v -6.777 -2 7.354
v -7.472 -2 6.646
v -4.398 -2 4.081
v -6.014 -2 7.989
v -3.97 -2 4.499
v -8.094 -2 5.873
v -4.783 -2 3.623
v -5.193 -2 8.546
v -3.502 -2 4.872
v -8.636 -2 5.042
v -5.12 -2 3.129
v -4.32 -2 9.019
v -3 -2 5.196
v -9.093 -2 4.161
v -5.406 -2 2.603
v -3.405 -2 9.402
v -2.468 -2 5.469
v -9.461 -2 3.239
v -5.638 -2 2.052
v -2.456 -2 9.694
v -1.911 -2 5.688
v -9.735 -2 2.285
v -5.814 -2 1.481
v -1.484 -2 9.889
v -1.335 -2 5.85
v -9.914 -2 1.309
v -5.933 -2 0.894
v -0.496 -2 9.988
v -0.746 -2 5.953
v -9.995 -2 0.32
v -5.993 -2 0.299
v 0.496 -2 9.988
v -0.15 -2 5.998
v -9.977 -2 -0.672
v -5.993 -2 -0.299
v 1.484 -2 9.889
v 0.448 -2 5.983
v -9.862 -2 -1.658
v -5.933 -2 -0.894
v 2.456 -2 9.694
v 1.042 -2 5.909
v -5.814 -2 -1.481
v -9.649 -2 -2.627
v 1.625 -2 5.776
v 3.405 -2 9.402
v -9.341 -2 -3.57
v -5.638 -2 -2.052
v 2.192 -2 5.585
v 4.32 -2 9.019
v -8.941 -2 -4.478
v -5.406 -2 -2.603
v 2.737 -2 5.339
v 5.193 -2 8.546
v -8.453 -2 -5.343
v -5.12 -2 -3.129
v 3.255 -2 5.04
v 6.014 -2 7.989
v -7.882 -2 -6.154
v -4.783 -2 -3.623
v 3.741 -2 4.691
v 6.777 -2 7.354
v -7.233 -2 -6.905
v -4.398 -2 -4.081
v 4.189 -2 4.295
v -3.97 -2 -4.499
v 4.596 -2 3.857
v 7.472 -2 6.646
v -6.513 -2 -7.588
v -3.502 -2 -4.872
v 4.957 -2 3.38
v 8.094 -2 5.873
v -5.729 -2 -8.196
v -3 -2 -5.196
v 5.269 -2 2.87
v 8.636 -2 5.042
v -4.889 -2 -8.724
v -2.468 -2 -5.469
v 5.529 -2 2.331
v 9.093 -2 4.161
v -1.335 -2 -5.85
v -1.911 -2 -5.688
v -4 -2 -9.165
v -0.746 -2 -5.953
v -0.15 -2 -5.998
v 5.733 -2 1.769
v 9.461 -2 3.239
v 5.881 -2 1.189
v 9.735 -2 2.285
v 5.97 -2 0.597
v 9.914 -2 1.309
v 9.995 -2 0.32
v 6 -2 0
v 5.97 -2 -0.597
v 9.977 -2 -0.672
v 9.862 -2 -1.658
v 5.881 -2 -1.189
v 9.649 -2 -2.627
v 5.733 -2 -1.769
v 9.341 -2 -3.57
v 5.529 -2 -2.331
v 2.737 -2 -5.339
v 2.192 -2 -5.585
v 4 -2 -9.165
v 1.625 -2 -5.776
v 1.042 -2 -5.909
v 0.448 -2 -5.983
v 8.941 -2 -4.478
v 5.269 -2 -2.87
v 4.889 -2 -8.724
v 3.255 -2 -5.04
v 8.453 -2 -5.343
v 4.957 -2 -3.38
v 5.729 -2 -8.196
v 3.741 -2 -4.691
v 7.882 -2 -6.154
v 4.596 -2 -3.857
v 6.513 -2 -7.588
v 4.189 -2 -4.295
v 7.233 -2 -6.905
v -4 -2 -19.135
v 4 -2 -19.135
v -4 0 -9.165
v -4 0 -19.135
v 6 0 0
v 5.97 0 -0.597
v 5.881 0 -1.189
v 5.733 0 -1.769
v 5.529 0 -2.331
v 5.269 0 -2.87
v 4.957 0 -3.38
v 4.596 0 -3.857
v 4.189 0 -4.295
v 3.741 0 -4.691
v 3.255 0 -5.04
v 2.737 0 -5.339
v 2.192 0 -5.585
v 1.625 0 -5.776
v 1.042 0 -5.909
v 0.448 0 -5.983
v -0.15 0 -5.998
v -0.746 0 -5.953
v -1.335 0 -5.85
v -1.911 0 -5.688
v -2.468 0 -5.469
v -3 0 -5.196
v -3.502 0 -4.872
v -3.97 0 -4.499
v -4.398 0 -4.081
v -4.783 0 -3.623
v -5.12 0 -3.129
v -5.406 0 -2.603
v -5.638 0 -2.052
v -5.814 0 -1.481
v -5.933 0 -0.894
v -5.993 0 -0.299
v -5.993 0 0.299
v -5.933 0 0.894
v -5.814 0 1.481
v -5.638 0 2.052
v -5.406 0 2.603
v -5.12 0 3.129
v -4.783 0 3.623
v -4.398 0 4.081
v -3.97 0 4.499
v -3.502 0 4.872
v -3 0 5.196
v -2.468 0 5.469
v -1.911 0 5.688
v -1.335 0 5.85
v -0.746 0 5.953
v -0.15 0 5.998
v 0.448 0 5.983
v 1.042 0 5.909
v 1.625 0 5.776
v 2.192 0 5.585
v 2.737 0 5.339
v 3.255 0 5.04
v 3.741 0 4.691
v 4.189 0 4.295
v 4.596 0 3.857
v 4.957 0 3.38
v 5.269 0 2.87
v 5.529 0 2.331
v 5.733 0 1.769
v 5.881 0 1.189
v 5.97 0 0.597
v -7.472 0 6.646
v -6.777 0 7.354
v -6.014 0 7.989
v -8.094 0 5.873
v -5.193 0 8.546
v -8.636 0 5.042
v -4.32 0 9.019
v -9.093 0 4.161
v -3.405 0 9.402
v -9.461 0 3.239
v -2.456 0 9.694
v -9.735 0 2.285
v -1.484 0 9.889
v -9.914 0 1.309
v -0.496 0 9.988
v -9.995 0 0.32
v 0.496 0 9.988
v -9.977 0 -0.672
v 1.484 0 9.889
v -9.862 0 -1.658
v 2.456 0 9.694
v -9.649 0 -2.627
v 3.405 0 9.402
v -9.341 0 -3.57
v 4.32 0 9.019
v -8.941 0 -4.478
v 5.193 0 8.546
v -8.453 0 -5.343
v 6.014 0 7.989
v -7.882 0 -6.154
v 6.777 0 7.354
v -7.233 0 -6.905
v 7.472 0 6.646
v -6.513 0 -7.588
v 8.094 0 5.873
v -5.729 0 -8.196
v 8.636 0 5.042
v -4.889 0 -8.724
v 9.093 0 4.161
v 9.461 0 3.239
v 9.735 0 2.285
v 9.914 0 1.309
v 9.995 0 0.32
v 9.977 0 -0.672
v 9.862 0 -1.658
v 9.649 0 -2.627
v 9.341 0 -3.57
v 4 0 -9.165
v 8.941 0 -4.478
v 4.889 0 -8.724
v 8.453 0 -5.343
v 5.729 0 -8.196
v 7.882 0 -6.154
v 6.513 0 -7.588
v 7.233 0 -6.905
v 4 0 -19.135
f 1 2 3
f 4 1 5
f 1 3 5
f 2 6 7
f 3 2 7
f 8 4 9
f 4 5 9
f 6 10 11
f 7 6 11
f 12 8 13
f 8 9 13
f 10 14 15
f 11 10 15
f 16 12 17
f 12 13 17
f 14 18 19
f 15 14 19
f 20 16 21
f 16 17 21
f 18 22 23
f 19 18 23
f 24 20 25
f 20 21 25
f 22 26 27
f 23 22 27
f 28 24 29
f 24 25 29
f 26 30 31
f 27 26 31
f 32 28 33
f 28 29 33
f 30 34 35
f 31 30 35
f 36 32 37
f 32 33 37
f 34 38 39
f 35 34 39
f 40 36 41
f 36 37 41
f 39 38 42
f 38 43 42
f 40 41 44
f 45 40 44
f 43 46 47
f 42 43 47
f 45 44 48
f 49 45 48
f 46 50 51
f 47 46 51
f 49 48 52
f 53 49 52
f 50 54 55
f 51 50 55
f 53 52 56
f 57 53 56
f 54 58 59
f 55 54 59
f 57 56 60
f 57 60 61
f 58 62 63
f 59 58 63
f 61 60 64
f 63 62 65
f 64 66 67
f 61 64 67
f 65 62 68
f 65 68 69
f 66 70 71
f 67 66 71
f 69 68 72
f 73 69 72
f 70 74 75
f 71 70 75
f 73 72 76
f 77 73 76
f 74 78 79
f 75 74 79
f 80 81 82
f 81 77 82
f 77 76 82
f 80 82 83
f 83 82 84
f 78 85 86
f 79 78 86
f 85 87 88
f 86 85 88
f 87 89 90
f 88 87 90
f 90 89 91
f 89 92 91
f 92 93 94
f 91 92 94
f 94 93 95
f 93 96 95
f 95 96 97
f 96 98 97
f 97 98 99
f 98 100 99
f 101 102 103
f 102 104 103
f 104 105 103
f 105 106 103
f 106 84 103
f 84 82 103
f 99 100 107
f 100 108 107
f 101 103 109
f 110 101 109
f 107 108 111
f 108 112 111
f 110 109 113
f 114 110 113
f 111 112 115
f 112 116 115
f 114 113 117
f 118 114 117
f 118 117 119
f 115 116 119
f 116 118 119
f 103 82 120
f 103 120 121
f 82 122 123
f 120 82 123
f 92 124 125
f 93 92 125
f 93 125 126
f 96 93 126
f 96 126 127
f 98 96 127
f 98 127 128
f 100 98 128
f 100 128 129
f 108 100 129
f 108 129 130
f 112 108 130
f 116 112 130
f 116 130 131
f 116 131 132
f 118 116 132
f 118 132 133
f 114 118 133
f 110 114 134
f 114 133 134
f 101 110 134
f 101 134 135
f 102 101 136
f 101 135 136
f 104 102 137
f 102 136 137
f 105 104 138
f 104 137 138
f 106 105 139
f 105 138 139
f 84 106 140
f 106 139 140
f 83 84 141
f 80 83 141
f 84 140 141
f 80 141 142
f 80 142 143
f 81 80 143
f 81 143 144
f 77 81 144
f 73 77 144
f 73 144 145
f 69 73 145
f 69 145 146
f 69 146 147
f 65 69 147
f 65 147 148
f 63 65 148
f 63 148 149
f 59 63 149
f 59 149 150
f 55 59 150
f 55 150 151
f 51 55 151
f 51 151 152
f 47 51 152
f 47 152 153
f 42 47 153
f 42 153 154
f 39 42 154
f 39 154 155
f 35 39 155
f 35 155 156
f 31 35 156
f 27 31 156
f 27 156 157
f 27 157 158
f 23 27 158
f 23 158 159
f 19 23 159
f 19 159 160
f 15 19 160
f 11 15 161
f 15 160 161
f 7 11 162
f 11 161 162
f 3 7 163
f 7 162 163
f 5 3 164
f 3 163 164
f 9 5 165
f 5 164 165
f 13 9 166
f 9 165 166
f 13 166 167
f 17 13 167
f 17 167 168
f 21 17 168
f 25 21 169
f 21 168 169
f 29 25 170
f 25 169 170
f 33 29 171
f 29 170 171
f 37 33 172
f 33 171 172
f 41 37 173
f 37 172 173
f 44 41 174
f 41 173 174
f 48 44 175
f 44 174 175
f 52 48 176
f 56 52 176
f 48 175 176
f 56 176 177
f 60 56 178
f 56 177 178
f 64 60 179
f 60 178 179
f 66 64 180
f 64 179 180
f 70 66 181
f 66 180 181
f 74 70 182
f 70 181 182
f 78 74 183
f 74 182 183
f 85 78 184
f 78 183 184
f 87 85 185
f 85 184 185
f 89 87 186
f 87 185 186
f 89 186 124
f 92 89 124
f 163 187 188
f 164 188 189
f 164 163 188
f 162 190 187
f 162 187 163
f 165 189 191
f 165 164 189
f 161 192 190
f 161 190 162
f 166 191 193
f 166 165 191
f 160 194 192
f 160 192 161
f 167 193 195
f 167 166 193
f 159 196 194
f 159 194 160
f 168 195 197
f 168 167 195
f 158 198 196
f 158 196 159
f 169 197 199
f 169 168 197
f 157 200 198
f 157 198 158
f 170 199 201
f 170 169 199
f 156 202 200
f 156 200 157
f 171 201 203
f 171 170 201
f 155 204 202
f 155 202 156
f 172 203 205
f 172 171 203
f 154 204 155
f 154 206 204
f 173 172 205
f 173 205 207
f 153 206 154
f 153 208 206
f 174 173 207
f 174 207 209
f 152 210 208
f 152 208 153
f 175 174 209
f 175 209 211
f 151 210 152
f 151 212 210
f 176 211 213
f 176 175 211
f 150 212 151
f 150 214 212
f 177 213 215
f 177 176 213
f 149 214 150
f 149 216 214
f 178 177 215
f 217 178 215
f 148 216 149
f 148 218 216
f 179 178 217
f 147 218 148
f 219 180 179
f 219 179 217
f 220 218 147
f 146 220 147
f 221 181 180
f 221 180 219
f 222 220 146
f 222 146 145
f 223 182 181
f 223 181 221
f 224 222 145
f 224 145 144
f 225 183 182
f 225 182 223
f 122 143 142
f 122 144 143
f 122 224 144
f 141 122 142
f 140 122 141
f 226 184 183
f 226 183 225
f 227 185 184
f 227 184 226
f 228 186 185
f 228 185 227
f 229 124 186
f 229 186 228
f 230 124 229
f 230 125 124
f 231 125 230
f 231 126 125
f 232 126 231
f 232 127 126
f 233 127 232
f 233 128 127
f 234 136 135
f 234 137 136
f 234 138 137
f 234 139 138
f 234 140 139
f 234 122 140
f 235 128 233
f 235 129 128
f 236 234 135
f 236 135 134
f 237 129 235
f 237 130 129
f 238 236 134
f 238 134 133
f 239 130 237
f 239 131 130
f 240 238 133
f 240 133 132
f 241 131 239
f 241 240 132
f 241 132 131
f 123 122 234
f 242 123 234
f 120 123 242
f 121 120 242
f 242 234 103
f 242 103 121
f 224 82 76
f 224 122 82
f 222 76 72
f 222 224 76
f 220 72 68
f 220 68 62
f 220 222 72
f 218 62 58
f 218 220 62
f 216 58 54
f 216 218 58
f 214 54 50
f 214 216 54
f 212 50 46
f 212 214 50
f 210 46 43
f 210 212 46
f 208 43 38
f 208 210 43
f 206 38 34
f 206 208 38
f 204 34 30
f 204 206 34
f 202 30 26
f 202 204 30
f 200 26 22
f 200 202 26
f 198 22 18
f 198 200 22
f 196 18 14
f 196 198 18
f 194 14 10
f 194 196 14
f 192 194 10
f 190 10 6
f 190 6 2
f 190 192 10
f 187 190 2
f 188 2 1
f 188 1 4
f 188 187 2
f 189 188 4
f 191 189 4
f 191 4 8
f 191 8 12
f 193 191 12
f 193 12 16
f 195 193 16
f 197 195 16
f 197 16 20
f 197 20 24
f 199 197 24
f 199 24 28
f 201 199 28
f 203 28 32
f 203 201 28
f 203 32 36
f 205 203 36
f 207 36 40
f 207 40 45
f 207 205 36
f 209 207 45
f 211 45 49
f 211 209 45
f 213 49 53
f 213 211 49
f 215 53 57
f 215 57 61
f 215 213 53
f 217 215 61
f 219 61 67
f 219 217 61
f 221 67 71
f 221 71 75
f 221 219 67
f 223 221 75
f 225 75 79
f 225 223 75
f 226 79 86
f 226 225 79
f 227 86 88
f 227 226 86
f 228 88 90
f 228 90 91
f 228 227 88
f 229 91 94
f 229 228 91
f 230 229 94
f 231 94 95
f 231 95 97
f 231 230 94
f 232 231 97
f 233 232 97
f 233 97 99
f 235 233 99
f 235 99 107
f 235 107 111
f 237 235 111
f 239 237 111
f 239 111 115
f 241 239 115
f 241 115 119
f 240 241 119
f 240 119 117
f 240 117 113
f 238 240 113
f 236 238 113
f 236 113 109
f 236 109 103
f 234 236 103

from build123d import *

# Parameters (mm, degrees)
SKETCH1_R           = 10
BOSS_EXTRUDE1_DEPTH = 2
SKETCH2_W           = 8
SKETCH2_H           = 9.97
BOSS_EXTRUDE2_DEPTH = 2
SKETCH3_R           = 6
CUT_EXTRUDE1_DEPTH  = 3


with BuildPart() as part:
    # Sketch1 → Boss-Extrude1 (new body)
    with BuildSketch(Plane(origin=(0, 0, 0), x_dir=(1, 0, 0), z_dir=(0, 1, 0))):
        Circle(SKETCH1_R)
    extrude(amount=-BOSS_EXTRUDE1_DEPTH)

    # Sketch2 → Boss-Extrude2 (add)
    with BuildSketch(Plane(origin=(0, 0, 0), x_dir=(1, 0, 0), z_dir=(0, 1, 0))):
        with Locations((0, 14.15015139)):
            Rectangle(SKETCH2_W, SKETCH2_H)
    extrude(amount=-BOSS_EXTRUDE2_DEPTH)

    # Sketch3 → Cut-Extrude1 (cut, through all)
    with BuildSketch(Plane(origin=(0, 0, 0), x_dir=(1, 0, 0), z_dir=(0, 1, 0))):
        Circle(SKETCH3_R)
    extrude(amount=-CUT_EXTRUDE1_DEPTH, mode=Mode.SUBTRACT)


solid = part.part
